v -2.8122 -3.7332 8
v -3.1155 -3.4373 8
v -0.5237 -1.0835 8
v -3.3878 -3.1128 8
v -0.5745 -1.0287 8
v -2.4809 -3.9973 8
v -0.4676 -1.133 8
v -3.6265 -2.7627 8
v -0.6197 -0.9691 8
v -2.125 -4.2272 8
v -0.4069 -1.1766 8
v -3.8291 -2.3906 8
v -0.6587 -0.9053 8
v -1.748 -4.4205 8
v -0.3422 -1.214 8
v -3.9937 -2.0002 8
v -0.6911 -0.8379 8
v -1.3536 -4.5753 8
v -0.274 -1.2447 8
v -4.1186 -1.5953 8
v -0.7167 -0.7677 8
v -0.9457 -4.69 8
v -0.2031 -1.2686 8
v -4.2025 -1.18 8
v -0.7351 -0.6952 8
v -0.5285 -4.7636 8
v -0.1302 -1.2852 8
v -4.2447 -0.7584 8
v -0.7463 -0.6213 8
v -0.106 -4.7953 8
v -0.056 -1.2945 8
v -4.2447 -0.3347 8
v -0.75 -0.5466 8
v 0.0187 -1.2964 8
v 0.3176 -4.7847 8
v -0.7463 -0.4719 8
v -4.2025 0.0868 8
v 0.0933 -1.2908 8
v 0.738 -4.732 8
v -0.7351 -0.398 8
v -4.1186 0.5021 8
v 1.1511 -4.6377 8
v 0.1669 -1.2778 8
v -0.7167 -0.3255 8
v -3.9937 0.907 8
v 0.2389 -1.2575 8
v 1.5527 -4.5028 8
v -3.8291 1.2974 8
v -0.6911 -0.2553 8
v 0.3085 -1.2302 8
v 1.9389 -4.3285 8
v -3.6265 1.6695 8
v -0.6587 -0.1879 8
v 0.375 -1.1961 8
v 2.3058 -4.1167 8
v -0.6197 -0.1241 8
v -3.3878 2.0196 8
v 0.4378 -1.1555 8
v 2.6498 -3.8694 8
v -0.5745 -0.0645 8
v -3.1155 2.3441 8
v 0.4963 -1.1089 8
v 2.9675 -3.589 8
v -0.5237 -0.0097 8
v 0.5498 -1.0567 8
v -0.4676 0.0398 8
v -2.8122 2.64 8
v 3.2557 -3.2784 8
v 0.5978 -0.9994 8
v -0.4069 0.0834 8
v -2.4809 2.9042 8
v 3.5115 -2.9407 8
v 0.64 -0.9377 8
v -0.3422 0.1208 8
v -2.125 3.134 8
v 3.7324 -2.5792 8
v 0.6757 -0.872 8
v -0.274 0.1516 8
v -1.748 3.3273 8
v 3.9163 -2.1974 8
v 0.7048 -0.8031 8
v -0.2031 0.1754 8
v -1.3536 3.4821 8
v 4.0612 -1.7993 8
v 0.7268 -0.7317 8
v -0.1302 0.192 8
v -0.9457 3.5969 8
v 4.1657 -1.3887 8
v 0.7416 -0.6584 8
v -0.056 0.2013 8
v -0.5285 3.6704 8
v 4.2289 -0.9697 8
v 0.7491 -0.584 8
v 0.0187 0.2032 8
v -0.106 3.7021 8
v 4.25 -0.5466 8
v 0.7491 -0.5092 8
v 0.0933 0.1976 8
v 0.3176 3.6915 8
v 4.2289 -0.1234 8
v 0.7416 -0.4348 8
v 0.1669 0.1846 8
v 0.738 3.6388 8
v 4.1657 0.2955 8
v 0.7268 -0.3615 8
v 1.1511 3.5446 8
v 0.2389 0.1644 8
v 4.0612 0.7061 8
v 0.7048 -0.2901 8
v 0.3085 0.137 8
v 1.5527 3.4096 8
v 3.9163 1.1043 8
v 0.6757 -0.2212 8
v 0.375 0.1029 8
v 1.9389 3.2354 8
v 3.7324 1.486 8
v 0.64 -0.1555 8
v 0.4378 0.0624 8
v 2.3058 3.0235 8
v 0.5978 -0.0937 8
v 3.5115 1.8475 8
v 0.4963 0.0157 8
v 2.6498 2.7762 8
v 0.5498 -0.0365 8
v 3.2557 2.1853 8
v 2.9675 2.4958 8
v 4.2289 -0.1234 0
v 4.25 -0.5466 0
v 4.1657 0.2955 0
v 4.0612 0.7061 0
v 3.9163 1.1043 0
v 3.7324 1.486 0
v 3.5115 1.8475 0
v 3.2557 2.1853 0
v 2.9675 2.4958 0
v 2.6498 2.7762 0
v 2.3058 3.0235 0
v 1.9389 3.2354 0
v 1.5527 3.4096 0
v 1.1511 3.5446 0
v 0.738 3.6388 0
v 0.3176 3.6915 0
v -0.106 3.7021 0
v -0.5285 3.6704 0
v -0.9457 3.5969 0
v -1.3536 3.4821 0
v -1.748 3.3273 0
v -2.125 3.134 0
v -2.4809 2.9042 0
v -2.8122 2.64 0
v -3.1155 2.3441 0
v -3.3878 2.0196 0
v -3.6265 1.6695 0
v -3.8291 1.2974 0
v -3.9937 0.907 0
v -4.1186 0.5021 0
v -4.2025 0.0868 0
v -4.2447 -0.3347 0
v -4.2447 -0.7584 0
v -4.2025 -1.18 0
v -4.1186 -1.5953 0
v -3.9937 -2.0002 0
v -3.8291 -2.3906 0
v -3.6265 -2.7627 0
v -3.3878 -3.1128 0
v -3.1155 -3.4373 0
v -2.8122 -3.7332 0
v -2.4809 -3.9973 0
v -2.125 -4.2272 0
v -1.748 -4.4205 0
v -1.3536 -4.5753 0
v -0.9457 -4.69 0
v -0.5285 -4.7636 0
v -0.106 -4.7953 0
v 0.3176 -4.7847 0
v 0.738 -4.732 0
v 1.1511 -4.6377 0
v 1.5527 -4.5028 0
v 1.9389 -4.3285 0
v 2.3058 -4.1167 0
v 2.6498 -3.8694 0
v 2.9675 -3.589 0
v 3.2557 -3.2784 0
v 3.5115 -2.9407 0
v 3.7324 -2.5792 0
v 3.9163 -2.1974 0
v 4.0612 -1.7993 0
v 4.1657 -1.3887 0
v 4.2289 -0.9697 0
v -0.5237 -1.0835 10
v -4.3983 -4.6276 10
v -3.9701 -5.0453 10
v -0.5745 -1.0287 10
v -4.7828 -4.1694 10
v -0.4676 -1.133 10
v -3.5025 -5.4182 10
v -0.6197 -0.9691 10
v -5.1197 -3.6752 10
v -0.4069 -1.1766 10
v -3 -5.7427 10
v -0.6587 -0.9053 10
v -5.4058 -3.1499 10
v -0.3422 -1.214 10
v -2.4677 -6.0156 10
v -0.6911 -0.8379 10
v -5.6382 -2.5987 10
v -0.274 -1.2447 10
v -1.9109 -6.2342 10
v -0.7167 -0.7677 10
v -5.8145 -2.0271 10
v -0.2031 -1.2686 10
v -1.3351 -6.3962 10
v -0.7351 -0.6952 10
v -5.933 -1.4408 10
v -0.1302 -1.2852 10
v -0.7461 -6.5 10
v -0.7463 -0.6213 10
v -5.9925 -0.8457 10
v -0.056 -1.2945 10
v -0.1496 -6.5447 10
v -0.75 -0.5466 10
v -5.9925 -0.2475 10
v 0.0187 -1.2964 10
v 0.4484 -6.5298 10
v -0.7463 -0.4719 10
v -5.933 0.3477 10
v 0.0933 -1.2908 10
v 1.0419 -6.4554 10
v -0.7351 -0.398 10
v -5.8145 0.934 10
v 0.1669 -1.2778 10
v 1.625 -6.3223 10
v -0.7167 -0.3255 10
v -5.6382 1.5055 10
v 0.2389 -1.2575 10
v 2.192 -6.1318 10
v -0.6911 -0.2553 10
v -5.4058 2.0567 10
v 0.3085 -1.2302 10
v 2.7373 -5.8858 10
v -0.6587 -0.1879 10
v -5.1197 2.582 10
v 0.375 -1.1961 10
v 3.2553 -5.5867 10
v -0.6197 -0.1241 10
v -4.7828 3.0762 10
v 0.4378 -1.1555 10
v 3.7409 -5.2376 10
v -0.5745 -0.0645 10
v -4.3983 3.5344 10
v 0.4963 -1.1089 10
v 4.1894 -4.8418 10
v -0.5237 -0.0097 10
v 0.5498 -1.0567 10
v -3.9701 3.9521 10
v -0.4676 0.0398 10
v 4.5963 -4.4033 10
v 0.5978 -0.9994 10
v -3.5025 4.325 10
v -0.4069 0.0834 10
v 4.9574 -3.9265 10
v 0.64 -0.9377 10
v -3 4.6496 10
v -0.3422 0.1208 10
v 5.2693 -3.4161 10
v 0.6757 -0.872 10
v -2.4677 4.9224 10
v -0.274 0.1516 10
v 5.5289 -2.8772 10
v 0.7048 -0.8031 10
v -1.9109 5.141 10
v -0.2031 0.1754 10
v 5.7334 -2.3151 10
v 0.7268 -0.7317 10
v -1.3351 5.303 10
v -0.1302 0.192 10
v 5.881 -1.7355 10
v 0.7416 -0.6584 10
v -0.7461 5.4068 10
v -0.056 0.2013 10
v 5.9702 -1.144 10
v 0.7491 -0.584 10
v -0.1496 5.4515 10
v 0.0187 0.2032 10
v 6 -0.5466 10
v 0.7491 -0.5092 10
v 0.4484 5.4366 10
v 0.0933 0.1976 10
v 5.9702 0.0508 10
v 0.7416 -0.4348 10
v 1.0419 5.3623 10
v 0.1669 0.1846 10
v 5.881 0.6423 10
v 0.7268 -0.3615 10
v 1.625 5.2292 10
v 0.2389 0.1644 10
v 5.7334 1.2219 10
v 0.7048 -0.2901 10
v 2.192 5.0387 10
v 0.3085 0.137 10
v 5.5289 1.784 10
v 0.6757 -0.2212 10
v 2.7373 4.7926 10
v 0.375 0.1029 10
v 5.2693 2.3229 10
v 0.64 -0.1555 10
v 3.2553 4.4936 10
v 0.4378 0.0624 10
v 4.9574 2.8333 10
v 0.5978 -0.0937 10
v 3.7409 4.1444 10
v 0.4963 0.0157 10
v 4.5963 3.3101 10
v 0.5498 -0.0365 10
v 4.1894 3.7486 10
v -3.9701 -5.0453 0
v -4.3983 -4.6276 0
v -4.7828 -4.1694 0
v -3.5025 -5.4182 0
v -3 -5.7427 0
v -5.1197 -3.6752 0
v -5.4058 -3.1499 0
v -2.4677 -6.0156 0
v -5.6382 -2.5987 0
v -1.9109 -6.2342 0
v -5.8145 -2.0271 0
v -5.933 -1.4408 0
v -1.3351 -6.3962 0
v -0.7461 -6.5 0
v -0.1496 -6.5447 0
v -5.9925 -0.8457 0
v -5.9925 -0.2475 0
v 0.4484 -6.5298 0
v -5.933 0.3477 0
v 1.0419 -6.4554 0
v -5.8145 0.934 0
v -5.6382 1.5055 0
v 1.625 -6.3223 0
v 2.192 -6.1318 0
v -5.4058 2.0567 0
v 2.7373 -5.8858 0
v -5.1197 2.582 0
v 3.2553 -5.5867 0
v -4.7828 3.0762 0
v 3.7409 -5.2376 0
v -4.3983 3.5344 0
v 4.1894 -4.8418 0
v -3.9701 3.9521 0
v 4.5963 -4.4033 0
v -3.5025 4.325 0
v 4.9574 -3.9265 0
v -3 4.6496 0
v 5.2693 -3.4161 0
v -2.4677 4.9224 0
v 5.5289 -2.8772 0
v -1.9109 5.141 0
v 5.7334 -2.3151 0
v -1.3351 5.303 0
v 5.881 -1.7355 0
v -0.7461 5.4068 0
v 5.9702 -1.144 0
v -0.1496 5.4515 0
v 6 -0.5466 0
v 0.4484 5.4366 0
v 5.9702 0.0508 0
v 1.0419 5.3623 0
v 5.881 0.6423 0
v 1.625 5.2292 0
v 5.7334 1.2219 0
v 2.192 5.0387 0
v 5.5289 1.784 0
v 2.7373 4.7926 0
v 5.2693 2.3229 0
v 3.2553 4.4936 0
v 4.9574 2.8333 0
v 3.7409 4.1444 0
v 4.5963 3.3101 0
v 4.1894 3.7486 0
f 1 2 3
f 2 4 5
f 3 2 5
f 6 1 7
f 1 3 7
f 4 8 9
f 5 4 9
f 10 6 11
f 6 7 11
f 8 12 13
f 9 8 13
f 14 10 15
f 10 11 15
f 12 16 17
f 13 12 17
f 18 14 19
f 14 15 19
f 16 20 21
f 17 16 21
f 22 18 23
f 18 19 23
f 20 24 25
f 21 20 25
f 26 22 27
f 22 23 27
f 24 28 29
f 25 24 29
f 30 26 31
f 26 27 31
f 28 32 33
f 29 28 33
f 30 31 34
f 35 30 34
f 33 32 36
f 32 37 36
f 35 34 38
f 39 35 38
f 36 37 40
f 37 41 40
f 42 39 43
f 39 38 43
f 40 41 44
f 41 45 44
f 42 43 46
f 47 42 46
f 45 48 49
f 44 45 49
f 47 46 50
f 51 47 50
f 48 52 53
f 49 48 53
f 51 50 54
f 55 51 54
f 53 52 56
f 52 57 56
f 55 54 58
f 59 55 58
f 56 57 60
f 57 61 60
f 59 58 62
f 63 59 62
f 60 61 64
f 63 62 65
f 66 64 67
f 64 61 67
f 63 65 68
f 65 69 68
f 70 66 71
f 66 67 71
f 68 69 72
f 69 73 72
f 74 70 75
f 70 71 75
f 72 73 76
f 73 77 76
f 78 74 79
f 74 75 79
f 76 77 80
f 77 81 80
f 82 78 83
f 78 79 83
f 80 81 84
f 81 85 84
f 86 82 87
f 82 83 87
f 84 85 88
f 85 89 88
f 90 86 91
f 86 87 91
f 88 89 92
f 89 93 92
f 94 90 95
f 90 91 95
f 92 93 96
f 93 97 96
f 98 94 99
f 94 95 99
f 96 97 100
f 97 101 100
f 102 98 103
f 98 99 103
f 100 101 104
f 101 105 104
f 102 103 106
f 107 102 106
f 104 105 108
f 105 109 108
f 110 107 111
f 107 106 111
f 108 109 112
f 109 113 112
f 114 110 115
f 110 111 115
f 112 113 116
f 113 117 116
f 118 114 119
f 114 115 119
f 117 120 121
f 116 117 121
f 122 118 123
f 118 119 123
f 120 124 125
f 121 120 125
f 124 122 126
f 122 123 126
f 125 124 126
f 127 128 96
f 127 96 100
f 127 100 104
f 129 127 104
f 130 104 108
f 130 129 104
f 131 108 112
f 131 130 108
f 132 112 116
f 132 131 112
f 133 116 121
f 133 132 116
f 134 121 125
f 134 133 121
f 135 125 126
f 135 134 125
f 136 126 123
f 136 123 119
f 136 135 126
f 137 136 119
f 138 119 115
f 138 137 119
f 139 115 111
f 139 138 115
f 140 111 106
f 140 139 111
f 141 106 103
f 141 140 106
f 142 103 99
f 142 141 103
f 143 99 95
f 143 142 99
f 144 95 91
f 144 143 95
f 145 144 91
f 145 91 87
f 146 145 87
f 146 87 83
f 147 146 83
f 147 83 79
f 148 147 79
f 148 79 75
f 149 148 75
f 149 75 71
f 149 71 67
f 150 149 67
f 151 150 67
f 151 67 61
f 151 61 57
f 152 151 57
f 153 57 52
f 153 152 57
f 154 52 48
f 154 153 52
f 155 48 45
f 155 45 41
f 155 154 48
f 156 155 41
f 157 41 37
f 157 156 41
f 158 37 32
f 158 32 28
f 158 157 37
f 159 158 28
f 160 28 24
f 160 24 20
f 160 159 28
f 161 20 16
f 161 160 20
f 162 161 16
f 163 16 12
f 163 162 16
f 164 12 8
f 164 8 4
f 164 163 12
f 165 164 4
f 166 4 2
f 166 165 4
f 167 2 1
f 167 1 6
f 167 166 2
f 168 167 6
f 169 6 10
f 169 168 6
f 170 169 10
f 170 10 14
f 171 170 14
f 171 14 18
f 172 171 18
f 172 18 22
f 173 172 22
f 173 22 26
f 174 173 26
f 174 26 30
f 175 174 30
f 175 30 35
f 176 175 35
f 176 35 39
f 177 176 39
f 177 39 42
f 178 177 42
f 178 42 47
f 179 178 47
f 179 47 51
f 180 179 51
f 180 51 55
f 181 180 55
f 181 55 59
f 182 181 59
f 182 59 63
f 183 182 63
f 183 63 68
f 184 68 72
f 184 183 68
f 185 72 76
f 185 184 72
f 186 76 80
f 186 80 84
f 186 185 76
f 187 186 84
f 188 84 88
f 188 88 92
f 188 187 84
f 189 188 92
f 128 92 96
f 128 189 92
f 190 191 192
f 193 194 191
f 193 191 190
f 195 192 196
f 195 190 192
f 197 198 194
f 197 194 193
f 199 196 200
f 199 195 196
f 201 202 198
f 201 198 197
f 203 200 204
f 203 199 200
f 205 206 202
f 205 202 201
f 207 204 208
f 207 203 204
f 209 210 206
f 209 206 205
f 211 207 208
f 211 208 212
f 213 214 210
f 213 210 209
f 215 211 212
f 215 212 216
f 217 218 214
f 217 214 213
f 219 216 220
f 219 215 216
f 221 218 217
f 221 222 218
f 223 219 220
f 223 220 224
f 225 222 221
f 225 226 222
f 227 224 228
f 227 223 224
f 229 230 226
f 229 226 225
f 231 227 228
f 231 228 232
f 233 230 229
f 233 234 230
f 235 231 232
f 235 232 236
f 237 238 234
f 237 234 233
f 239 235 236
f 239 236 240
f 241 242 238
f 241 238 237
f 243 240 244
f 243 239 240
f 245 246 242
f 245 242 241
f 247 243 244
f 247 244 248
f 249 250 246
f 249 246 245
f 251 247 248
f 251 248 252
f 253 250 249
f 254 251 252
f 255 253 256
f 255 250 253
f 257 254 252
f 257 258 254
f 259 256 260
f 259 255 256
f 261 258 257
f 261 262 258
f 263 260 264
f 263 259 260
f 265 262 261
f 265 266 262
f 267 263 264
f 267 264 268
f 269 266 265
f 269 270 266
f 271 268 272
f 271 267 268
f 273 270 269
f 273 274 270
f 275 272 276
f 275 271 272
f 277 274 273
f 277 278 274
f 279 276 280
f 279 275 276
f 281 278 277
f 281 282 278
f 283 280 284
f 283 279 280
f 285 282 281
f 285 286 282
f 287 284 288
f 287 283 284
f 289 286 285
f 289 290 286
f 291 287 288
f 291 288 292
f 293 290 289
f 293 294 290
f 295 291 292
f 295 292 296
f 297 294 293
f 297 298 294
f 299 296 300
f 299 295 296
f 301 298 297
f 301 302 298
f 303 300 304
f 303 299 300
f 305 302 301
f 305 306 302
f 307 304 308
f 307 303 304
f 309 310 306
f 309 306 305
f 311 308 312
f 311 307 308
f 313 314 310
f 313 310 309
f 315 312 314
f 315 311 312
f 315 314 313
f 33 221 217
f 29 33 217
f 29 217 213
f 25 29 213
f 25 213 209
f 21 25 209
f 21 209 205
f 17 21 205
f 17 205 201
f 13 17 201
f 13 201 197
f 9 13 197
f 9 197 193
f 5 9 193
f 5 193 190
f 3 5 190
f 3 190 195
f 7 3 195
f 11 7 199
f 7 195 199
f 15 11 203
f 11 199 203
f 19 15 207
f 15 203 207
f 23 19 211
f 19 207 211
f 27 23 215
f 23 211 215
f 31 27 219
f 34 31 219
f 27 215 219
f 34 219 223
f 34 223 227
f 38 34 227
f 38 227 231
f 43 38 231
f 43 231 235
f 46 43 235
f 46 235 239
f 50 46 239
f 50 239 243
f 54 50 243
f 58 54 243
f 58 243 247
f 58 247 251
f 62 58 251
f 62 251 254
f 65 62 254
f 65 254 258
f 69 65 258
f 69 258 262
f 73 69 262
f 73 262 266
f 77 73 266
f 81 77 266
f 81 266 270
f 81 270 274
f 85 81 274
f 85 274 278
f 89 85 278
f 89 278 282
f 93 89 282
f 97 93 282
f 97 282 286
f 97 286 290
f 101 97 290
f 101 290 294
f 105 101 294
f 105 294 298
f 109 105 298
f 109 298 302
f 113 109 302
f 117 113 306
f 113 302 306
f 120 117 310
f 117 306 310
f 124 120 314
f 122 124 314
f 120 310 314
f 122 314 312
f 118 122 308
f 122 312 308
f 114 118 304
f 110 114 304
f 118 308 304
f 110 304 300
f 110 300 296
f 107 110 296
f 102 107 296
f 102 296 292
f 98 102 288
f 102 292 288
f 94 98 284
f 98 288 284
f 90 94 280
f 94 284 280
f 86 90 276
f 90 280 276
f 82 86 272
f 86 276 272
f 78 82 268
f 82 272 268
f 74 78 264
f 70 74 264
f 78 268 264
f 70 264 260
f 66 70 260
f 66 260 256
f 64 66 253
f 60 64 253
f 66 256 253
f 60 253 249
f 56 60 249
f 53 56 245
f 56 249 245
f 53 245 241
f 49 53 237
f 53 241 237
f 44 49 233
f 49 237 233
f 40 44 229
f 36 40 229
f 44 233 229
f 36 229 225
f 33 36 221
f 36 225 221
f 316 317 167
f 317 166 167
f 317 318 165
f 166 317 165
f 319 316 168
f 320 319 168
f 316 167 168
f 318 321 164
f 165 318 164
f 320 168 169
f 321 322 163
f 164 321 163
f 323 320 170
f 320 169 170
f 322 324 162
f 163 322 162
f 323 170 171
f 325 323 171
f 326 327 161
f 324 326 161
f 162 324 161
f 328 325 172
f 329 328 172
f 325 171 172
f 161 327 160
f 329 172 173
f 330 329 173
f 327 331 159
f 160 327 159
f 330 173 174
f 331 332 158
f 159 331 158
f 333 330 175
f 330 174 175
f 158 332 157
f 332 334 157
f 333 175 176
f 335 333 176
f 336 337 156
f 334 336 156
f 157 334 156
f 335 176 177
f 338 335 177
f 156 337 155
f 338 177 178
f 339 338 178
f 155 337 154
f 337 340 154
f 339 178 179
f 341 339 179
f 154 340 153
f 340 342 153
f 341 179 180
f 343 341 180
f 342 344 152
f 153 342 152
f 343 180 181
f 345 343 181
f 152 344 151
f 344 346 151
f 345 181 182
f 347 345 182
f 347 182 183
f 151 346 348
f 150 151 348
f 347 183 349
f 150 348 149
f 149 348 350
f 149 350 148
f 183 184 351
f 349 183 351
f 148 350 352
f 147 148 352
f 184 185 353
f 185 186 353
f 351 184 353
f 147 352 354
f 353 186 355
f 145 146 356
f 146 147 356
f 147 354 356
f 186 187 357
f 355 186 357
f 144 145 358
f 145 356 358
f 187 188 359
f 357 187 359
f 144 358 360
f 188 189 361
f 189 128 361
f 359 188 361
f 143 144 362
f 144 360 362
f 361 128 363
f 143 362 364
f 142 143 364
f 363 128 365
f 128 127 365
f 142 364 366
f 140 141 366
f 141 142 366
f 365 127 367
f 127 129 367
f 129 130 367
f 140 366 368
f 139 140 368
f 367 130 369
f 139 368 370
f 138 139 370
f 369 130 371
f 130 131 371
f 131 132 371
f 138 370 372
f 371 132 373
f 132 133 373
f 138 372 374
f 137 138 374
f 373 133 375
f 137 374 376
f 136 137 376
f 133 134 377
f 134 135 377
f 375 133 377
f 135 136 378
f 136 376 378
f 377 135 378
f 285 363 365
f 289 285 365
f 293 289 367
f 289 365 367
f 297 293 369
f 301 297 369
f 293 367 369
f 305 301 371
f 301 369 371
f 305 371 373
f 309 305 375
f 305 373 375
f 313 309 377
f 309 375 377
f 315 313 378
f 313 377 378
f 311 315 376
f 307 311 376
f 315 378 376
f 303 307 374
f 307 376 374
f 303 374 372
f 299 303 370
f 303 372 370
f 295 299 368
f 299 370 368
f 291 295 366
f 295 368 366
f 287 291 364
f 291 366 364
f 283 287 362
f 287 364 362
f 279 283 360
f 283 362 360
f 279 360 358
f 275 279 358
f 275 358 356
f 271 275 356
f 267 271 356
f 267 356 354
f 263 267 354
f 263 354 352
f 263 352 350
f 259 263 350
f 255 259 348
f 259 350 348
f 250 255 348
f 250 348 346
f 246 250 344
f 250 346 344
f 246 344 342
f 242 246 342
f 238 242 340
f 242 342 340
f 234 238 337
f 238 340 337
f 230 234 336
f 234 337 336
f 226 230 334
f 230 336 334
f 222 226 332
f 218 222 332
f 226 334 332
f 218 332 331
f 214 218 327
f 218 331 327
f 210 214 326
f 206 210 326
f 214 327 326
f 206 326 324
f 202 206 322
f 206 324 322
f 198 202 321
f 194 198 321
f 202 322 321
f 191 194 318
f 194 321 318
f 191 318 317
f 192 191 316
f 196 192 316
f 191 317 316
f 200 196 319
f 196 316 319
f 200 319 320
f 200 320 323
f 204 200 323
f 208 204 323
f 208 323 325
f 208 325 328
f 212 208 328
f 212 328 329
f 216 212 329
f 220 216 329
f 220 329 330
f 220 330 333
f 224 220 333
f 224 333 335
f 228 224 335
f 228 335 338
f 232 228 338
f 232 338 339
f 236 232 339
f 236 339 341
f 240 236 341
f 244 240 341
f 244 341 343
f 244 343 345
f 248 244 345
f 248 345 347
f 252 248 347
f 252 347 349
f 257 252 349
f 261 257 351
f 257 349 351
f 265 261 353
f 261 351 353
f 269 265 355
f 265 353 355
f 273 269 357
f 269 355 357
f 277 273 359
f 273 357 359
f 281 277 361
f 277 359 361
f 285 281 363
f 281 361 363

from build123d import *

# Parameters (mm, degrees)
F0_R     = 6
F0_R_2   = 4.25
F1_DEPTH = 10
F2_DEPTH = 8
F3_D     = 1.5


with BuildPart() as f1:
    # F0 (on Top) → F1 (new body)
    with BuildSketch(Plane.XY):
        with Locations((0, -0.5465864819)):
            Circle(F0_R)
        with Locations((0, -0.5465864819)):
            Circle(F0_R_2, mode=Mode.SUBTRACT)
        with Locations((0, -0.5465864819)):
            Circle(F0_R_2)
    extrude(amount=F1_DEPTH)

    # F0 (on Top) → F2 (cut)
    with BuildSketch(Plane.XY):
        with Locations((0, -0.5465864819)):
            Circle(F0_R_2)
    extrude(amount=F2_DEPTH, mode=Mode.SUBTRACT)

    # F3 (through all)
    with Locations(Plane(origin=(0, 0, 0), x_dir=(1, 0, 0), z_dir=(0, 0, -1))):
        with Locations((0, 0.5465864819)):
            Hole(F3_D / 2)


solid = f1.part
